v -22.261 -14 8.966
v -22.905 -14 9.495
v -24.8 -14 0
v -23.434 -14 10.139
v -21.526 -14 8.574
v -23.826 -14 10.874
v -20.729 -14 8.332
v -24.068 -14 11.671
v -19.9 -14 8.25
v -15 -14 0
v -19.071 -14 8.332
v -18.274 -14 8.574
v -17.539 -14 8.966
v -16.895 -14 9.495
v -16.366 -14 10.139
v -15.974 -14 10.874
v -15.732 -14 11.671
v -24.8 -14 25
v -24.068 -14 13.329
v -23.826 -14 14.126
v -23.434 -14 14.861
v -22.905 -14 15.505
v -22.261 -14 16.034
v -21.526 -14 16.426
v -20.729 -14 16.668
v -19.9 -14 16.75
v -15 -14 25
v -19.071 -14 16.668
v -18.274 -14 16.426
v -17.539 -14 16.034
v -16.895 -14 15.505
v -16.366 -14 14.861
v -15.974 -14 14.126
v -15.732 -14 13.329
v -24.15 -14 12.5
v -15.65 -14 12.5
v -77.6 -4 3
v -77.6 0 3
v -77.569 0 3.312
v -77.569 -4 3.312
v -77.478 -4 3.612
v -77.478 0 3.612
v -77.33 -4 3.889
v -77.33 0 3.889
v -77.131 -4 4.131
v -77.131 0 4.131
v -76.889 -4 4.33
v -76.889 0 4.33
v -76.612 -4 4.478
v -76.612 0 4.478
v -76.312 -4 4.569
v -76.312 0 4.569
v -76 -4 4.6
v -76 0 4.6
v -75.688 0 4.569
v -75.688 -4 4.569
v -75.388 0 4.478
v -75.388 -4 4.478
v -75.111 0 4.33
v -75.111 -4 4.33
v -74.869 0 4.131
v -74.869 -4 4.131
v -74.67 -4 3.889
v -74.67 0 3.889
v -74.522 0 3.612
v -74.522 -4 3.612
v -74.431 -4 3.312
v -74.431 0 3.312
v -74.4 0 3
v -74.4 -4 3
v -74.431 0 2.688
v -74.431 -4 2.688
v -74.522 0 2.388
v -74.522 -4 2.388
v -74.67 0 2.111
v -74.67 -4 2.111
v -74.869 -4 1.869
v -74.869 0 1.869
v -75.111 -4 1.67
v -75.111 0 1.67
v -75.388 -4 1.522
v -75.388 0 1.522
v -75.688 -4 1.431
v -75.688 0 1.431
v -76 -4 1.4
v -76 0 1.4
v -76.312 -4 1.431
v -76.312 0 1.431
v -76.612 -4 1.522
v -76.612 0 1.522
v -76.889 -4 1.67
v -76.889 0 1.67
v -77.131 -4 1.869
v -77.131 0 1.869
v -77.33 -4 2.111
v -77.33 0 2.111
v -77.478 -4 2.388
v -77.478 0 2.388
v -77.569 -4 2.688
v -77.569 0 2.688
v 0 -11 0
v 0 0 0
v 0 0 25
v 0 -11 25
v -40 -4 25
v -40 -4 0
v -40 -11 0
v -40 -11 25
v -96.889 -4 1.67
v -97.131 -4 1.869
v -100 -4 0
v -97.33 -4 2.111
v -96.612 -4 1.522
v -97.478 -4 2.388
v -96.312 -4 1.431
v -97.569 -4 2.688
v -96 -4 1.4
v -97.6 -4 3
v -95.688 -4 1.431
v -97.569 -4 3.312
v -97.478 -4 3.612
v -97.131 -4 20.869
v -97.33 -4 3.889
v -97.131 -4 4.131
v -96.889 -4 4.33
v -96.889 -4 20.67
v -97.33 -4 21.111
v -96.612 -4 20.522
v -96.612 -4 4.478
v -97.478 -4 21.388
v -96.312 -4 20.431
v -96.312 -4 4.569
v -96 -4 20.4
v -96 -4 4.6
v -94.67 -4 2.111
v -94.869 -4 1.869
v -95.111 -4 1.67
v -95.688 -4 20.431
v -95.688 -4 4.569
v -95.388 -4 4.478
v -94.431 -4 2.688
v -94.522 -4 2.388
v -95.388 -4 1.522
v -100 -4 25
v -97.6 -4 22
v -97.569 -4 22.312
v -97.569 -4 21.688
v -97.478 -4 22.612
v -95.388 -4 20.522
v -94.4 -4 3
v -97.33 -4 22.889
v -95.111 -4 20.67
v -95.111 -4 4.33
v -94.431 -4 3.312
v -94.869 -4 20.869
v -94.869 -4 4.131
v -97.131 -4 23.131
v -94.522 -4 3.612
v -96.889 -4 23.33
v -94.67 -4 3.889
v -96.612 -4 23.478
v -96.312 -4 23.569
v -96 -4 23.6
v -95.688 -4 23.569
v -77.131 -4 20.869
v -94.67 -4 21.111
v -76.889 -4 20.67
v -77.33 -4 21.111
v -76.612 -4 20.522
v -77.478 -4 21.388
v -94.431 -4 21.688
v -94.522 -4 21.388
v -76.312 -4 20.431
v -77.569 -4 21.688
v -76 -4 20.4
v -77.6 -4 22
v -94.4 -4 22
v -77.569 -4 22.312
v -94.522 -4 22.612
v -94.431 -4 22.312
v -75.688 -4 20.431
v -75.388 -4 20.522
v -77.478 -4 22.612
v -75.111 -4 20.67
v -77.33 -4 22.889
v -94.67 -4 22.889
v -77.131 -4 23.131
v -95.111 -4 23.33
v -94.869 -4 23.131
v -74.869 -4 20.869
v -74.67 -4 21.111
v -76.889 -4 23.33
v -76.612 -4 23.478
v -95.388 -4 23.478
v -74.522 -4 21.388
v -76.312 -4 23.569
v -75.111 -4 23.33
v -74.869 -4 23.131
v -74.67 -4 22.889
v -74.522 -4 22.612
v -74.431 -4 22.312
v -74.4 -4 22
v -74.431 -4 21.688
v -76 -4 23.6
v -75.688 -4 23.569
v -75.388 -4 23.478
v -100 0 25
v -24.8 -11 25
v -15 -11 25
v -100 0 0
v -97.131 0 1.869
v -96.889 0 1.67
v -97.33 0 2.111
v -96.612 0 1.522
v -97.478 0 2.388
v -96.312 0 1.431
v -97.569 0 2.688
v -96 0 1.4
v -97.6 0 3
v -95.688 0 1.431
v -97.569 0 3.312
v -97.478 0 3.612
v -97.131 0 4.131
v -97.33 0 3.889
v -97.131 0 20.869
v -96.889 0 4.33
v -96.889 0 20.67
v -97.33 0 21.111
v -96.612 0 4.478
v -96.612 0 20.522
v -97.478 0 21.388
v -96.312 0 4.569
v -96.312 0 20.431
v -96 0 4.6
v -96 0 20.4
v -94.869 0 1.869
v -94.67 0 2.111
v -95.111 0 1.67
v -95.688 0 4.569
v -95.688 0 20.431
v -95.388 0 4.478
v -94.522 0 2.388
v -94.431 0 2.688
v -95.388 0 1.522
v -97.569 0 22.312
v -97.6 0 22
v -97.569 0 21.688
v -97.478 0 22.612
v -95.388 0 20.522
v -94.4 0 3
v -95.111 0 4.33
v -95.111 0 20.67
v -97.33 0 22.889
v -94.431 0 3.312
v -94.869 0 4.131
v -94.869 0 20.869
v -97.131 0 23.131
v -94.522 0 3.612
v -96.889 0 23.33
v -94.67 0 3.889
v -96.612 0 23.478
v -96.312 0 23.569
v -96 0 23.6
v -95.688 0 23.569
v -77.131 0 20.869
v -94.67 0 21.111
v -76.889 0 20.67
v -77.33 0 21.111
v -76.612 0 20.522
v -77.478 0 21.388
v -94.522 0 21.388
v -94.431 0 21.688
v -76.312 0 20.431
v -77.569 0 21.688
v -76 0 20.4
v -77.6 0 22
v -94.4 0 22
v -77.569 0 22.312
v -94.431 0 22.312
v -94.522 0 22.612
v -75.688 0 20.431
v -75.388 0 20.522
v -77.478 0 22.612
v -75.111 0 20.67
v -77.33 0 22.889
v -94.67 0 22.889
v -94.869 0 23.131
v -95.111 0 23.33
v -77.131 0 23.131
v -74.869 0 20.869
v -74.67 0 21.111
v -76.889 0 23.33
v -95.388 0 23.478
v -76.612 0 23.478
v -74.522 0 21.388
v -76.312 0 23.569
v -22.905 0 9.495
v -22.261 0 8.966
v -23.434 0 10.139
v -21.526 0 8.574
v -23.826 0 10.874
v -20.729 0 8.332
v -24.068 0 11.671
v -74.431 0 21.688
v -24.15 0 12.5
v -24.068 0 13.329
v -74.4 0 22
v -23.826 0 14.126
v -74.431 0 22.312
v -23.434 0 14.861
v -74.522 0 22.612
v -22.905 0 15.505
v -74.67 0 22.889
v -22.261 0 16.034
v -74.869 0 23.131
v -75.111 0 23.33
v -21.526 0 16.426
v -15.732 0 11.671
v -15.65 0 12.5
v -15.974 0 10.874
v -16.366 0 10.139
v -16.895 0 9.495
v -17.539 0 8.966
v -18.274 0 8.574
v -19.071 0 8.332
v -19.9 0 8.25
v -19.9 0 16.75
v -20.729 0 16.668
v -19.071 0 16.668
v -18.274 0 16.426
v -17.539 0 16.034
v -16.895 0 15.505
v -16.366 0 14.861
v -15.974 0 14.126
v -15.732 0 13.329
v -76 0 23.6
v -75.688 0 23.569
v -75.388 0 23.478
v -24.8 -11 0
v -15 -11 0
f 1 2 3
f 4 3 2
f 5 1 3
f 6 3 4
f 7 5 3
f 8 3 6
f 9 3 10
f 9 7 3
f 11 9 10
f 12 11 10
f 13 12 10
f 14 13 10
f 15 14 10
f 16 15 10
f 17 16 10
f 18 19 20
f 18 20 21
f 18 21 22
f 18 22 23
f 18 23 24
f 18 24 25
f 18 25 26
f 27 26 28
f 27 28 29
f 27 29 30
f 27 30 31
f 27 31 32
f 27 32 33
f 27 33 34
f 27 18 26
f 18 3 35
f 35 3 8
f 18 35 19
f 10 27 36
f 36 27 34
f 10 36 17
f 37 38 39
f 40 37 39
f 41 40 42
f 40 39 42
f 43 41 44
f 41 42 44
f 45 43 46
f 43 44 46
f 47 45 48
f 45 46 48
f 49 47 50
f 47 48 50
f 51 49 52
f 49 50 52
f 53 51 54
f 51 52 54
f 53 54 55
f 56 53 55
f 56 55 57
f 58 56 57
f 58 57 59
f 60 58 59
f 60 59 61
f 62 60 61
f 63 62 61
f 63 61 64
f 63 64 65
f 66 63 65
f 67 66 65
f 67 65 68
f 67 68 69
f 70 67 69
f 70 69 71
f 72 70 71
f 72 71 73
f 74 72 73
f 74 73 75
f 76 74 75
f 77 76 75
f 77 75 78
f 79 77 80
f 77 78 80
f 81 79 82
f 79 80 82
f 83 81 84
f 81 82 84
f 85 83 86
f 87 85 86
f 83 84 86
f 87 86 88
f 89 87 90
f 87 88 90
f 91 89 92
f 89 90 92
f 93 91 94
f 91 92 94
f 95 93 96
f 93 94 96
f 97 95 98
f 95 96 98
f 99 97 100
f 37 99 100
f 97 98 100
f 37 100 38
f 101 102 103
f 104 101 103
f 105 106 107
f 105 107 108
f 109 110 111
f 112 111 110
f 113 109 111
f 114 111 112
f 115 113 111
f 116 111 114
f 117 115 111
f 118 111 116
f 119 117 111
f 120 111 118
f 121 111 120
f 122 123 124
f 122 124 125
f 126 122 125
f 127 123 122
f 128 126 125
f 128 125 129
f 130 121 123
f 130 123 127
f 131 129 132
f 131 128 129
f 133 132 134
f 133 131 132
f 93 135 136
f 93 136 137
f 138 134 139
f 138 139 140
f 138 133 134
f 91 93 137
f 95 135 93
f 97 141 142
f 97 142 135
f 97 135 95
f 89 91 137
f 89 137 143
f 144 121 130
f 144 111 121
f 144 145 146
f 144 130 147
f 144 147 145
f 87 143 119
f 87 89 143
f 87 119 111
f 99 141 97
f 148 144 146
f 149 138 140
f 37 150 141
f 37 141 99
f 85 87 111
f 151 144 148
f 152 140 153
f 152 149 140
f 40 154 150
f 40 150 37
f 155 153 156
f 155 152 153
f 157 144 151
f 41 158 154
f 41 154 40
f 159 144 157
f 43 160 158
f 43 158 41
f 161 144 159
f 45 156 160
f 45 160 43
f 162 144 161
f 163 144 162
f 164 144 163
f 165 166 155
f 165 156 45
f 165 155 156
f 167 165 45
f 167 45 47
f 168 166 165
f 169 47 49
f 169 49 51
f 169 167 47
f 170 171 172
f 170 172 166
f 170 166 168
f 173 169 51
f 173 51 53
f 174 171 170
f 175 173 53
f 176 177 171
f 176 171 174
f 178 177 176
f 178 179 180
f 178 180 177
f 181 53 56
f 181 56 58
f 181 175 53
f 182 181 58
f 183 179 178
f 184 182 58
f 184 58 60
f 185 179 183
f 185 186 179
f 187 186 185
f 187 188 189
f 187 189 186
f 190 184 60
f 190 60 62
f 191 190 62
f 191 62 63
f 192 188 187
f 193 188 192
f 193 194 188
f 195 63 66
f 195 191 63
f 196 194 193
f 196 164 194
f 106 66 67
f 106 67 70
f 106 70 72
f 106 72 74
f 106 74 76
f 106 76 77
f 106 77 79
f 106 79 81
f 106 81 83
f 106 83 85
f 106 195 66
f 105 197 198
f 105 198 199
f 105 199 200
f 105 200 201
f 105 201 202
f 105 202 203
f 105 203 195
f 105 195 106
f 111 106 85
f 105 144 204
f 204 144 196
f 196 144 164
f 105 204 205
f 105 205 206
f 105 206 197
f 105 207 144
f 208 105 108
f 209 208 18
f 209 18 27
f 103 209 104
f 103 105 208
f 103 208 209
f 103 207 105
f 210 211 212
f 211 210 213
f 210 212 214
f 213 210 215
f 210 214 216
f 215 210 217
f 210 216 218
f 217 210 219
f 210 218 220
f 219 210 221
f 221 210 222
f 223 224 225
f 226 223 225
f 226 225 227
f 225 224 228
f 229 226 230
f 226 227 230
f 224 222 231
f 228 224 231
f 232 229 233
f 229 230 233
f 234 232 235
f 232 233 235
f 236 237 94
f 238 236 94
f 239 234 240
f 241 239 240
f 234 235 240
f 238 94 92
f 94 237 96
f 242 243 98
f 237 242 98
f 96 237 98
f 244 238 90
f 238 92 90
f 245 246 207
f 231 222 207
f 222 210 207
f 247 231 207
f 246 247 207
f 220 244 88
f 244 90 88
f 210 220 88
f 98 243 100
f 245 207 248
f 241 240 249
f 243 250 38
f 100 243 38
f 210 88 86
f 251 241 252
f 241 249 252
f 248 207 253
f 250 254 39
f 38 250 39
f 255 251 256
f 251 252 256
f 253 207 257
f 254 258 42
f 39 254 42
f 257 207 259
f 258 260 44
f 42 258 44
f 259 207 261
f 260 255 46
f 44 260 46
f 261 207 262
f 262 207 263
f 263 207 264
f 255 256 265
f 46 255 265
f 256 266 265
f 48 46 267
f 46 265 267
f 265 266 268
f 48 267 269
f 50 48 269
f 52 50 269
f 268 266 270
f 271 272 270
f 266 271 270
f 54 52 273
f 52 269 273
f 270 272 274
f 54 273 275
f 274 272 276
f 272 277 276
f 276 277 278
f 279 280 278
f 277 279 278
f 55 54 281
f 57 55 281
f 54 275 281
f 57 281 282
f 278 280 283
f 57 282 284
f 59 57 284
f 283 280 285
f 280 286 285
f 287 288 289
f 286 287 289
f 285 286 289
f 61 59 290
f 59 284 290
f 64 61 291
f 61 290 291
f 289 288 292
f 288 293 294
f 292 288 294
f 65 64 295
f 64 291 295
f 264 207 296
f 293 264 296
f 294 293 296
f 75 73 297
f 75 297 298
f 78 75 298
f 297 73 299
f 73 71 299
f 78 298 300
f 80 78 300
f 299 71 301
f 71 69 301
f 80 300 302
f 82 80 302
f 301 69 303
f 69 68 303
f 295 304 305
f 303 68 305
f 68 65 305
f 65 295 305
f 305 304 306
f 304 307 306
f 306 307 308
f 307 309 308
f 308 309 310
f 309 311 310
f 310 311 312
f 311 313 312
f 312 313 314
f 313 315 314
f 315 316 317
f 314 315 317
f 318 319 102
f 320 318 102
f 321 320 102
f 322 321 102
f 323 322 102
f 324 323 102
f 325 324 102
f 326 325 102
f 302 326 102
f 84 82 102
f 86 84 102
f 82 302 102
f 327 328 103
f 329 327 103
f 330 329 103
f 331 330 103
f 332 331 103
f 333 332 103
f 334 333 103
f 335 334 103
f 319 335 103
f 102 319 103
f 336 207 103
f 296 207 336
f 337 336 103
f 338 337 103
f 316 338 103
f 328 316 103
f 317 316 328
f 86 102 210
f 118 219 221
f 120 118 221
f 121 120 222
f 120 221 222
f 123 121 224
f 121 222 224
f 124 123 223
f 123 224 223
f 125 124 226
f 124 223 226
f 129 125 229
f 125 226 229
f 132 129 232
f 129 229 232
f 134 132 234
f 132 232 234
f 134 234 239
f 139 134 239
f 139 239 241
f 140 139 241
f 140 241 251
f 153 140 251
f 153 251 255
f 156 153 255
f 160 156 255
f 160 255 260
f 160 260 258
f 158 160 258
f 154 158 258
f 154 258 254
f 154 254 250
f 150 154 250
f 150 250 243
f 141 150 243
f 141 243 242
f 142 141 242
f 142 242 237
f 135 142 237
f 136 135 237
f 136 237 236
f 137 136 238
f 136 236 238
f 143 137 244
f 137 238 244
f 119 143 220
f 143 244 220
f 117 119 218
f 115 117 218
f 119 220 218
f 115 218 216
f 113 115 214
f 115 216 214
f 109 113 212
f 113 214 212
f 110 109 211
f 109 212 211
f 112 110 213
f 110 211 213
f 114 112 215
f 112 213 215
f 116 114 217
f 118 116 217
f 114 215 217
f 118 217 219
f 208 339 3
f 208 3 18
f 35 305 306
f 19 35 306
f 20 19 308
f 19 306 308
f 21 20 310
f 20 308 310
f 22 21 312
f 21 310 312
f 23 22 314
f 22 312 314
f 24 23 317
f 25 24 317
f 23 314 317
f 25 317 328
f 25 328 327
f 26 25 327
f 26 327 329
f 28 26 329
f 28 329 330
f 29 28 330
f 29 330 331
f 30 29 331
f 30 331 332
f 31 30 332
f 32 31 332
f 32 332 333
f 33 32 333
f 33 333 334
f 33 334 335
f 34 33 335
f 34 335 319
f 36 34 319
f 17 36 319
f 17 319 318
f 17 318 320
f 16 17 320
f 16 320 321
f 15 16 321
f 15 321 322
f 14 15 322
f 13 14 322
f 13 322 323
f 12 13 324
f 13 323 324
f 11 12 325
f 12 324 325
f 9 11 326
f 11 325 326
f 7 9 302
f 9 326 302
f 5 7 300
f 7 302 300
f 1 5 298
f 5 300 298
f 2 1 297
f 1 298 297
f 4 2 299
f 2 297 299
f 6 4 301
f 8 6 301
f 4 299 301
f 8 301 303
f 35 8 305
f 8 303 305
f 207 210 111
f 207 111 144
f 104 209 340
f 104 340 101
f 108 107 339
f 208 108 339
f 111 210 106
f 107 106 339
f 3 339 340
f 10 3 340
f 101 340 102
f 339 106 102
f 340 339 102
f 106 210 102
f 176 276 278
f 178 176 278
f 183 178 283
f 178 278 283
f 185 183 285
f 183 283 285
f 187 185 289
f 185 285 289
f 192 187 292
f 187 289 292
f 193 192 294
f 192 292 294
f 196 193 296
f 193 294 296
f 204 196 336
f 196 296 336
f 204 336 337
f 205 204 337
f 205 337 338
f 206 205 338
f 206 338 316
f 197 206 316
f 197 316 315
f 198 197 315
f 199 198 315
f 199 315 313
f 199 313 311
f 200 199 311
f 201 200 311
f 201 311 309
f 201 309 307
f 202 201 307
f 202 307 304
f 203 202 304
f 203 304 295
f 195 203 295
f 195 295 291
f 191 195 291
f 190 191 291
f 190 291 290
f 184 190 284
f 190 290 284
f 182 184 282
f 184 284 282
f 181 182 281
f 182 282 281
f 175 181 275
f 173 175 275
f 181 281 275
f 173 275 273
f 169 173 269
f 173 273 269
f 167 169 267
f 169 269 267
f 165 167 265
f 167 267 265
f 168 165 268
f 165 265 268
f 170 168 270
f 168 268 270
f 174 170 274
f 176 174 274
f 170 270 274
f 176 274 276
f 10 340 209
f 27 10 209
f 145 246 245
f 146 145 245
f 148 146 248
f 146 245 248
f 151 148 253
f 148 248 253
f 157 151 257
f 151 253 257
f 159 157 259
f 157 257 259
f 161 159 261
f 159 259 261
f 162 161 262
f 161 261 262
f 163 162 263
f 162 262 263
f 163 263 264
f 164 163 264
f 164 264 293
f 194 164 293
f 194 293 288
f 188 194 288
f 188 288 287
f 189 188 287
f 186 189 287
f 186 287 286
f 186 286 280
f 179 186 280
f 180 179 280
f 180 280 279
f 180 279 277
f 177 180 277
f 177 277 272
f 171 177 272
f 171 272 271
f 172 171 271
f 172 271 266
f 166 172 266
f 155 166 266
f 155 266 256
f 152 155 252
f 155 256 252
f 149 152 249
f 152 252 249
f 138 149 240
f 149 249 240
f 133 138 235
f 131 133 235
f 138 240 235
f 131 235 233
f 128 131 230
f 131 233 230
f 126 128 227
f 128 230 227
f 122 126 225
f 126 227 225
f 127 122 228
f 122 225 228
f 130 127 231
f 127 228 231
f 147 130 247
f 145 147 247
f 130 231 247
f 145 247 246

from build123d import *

# Parameters (mm, degrees)
F0_W     = 100
F0_H     = 25
F2_DEPTH = 4
F3_W     = 40
F3_H     = 25
F4_DEPTH = 11
F5_W     = 9.8
F5_H     = 25
F6_DEPTH = 3
F9_D     = 3.2
F10_D    = 3.2
F12_D    = 8.5
F14_D    = 3.2


with BuildPart() as f2:
    # F0 (on Front) → F2 (new body)
    with BuildSketch(Plane.XZ):
        with Locations((-50, 12.5)):
            Rectangle(F0_W, F0_H)
    extrude(amount=F2_DEPTH)

    # F3 (on Front) → F4 (join)
    with BuildSketch(Plane.XZ):
        with Locations((-20, 12.5)):
            Rectangle(F3_W, F3_H)
    extrude(amount=F4_DEPTH)

    # F5 (on face) → F6 (join)
    with BuildSketch(Plane.XZ.offset(11)):
        with Locations((-19.9, 12.5)):
            Rectangle(F5_W, F5_H)
    extrude(amount=F6_DEPTH)

    # F9 (through all)
    with Locations(Plane.XZ.offset(4)):
        with Locations((-96, 22)):
            Hole(F9_D / 2)

    # F10 (through all)
    with Locations(Plane.XZ.offset(4)):
        with Locations((-76, 22)):
            Hole(F10_D / 2)

    # F12 (through all)
    with Locations(Plane.XZ.offset(14)):
        with Locations((-19.9, 12.5)):
            Hole(F12_D / 2)

    # F14 (through all)
    with Locations(Plane.XZ.offset(4)):
        with Locations((-96, 3), (-76, 3)):
            Hole(F14_D / 2)


solid = f2.part
